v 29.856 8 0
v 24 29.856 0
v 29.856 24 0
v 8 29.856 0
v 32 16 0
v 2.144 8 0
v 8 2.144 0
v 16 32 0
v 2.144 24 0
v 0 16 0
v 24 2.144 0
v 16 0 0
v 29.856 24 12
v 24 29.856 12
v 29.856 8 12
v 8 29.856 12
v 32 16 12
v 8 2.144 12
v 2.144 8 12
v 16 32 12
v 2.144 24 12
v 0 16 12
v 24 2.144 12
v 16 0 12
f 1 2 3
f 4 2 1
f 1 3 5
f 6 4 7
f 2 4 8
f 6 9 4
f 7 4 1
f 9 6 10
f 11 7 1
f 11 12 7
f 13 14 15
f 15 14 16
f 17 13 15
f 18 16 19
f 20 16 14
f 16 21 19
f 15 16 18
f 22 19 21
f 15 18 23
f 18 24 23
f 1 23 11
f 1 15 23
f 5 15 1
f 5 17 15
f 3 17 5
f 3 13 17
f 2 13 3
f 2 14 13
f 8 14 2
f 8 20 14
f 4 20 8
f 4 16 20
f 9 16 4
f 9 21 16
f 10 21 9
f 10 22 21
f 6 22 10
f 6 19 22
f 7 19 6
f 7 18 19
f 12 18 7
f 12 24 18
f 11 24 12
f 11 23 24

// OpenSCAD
$fn = 32;

// ----------------------------------------------------------------------
// Eccentric disc: egg, 12 mm thick
// ----------------------------------------------------------------------

// --- parameters (mm) ---
profile_height = 12;      // extrusion height
profile_points = 12;      // points of the closed outline

profile = [[0, 16], [2.144, 8], [8, 2.144], [16, 0], [24, 2.144], [29.856, 8], [32, 16], [29.856, 24], [24, 29.856], [16, 32], [8, 29.856], [2.144, 24]];  // single closed polygon, 12 points, counter clockwise

// --- the one profile operation ---
linear_extrude(height = profile_height) polygon(points = profile);
